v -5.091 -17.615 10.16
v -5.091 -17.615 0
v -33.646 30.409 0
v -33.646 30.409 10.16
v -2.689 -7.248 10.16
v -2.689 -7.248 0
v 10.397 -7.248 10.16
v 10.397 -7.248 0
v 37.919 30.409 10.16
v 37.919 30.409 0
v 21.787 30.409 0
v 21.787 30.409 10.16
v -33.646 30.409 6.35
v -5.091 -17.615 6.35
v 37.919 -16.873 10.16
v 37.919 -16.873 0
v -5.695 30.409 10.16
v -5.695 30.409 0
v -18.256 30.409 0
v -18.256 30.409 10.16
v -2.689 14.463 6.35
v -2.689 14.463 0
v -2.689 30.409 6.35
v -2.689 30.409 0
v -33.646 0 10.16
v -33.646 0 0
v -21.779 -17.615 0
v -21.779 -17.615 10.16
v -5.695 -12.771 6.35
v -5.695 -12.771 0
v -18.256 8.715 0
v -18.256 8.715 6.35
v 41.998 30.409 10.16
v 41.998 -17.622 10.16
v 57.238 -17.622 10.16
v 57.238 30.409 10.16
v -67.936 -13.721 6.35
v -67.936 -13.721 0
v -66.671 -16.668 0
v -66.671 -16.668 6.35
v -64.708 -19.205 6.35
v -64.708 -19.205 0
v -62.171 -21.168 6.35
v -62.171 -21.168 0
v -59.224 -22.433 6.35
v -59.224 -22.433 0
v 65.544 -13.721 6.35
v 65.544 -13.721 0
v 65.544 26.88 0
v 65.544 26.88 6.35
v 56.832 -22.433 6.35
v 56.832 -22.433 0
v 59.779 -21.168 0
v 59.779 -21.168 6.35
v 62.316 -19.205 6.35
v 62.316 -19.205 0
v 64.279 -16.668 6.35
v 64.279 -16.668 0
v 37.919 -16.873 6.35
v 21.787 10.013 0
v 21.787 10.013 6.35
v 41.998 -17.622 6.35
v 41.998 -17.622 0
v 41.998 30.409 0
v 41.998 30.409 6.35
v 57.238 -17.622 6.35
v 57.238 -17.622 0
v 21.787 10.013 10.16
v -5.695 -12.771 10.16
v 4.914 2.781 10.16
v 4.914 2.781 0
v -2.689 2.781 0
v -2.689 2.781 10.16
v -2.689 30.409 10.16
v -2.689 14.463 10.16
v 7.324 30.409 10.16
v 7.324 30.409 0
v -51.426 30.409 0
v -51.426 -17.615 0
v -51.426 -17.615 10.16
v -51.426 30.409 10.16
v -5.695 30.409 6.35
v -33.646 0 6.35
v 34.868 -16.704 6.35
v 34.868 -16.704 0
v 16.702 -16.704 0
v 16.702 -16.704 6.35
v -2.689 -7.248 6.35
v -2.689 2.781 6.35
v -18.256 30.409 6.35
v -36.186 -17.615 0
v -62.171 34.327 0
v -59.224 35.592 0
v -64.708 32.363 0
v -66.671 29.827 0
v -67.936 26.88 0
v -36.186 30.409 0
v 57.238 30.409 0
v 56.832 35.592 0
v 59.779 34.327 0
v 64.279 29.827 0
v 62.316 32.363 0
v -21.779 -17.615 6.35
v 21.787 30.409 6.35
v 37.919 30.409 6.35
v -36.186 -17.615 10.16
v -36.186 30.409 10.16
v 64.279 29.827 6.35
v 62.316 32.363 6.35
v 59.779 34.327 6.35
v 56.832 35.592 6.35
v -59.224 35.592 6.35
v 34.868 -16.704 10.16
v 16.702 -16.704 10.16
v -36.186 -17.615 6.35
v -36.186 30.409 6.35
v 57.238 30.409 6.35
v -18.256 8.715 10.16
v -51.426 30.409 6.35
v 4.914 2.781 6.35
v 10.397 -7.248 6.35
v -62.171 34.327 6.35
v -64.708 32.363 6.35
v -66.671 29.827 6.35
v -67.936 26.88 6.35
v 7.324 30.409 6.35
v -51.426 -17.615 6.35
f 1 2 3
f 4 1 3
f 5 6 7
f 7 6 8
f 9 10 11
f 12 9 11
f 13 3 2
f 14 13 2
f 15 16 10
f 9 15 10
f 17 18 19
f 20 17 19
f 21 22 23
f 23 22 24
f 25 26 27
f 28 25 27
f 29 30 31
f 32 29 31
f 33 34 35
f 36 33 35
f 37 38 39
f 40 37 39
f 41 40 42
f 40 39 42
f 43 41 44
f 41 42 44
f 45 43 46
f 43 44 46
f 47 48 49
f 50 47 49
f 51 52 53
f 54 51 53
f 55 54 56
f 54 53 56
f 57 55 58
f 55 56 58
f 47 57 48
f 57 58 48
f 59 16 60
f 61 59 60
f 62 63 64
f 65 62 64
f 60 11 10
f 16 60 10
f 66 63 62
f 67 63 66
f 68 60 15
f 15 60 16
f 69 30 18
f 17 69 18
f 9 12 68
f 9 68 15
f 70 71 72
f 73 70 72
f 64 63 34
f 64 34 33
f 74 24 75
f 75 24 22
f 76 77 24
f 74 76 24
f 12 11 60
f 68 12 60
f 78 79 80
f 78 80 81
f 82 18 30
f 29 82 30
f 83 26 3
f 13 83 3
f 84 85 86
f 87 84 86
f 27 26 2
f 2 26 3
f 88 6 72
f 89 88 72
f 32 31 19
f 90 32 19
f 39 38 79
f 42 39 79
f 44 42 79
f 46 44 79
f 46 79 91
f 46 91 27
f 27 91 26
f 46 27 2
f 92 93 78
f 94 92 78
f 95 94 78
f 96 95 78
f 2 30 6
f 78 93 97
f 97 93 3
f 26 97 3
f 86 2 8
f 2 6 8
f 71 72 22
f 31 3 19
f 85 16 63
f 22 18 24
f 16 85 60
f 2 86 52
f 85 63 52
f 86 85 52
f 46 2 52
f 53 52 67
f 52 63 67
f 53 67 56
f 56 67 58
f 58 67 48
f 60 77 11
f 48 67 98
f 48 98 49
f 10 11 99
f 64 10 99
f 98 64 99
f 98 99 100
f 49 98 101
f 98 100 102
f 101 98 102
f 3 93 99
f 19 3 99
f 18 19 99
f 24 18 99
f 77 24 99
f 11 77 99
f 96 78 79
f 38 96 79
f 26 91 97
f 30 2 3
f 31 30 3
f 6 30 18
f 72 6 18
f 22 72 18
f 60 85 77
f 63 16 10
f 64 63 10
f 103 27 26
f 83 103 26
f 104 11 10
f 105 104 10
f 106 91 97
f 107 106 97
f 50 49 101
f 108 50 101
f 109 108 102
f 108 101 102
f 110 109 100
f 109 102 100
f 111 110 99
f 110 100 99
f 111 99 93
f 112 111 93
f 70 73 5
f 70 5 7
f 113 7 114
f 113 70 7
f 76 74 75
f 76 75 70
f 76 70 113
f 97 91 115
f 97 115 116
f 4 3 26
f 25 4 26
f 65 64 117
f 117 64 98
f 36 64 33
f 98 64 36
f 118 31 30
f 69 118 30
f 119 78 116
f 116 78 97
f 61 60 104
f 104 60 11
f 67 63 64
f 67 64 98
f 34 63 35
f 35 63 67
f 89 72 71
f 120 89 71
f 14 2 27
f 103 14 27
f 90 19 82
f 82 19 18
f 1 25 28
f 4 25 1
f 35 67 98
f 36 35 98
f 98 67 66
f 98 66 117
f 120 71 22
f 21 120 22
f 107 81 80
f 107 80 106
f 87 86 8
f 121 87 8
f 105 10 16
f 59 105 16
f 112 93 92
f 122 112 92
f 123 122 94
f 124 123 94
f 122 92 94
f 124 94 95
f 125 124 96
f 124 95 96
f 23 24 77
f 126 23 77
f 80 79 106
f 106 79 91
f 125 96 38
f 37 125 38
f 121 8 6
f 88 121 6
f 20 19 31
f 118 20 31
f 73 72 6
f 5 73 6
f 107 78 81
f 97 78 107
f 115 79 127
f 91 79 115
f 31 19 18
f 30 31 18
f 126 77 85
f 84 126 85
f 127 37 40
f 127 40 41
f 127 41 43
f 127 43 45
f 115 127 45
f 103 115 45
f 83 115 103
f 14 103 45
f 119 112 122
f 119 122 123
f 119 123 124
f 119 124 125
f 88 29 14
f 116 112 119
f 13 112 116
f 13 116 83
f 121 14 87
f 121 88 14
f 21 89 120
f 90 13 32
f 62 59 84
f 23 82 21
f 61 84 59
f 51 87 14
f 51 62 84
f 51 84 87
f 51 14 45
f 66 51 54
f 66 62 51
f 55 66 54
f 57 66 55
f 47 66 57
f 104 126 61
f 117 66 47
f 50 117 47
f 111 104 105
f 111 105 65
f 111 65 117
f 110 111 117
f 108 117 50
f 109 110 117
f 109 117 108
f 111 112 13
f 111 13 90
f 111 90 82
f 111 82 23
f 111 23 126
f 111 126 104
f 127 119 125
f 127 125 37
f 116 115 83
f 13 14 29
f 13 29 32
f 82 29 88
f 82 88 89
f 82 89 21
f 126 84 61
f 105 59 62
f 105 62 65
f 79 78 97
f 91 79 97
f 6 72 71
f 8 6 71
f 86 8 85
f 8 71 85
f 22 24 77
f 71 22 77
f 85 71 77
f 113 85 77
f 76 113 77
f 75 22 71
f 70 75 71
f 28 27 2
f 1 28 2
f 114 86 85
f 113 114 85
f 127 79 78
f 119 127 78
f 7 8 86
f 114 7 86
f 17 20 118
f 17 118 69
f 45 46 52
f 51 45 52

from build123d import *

# Parameters (mm, degrees)
F0_W     = 15.24
F0_H     = 48.024542
F0_H_2   = 48.0314
F1_DEPTH = 10.16
F2_DEPTH = 6.35


with BuildPart() as f1:
    # F0 (on Top) → F1 (new body)
    with BuildSketch(Plane.XY):
        with Locations((-43.806466, 6.397091)):
            Rectangle(F0_W, F0_H)
        Polygon((-33.646466, 0), (-21.779397, -17.61518), (-5.091332, -17.61518), (-33.646466, 30.409362), align=None)
        Polygon((-5.695198, 30.409362), (-18.25636, 30.409362), (-18.25636, 8.714878), (-5.695198, -12.770638), align=None)
        Polygon((7.324206, 30.409362), (-2.688632, 30.409362), (-2.688632, 14.46299), (4.913708, 2.781344), (-2.688632, 2.781344), (-2.688632, -7.247503), (10.397398, -7.247503), (16.701777, -16.704073), (34.868321, -16.704073), align=None)
        Polygon((37.918992, 30.409362), (21.787196, 30.409362), (21.787196, 10.012839), (37.918992, -16.873488), align=None)
        with Locations((49.618297, 6.393662)):
            Rectangle(F0_W, F0_H_2)
    extrude(amount=F1_DEPTH)


with BuildPart() as f2:
    # F0 (on Top) → F2 (new body)
    with BuildSketch(Plane.XY):
        with BuildLine():
            Line((56.832131, 35.592196), (-59.224266, 35.592196))
            ThreePointArc((-59.224266, 35.592196), (-64.707636, 32.363366), (-67.936466, 26.879996))
            Line((-67.936466, 26.879996), (-67.936466, -13.721297))
            ThreePointArc((-67.936466, -13.721297), (-64.707636, -19.204667), (-59.224266, -22.433497))
            Line((-59.224266, -22.433497), (56.832131, -22.433497))
            ThreePointArc((56.832131, -22.433497), (62.315501, -19.204667), (65.544331, -13.721297))
            Line((65.544331, -13.721297), (65.544331, 26.879996))
            ThreePointArc((65.544331, 26.879996), (62.315501, 32.363366), (56.832131, 35.592196))
        make_face()
        with Locations((-43.806466, 6.397091)):
            Rectangle(F0_W, F0_H, mode=Mode.SUBTRACT)
        Polygon((-5.091332, -17.61518), (-21.779397, -17.61518), (-33.646466, 0), (-33.646466, 30.409362), align=None, mode=Mode.SUBTRACT)
        with Locations((49.618297, 6.393662)):
            Rectangle(F0_W, F0_H_2, mode=Mode.SUBTRACT)
        Polygon((-18.25636, 8.714878), (-18.25636, 30.409362), (-5.695198, 30.409362), (-5.695198, -12.770638), align=None, mode=Mode.SUBTRACT)
        Polygon((-2.688632, 14.46299), (-2.688632, 30.409362), (7.324206, 30.409362), (34.868321, -16.704073), (16.701777, -16.704073), (10.397398, -7.247503), (-2.688632, -7.247503), (-2.688632, 2.781344), (4.913708, 2.781344), align=None, mode=Mode.SUBTRACT)
        Polygon((21.787196, 10.012839), (21.787196, 30.409362), (37.918992, 30.409362), (37.918992, -16.873488), align=None, mode=Mode.SUBTRACT)
    extrude(amount=F2_DEPTH)


solid = Compound([f1.part, f2.part])
